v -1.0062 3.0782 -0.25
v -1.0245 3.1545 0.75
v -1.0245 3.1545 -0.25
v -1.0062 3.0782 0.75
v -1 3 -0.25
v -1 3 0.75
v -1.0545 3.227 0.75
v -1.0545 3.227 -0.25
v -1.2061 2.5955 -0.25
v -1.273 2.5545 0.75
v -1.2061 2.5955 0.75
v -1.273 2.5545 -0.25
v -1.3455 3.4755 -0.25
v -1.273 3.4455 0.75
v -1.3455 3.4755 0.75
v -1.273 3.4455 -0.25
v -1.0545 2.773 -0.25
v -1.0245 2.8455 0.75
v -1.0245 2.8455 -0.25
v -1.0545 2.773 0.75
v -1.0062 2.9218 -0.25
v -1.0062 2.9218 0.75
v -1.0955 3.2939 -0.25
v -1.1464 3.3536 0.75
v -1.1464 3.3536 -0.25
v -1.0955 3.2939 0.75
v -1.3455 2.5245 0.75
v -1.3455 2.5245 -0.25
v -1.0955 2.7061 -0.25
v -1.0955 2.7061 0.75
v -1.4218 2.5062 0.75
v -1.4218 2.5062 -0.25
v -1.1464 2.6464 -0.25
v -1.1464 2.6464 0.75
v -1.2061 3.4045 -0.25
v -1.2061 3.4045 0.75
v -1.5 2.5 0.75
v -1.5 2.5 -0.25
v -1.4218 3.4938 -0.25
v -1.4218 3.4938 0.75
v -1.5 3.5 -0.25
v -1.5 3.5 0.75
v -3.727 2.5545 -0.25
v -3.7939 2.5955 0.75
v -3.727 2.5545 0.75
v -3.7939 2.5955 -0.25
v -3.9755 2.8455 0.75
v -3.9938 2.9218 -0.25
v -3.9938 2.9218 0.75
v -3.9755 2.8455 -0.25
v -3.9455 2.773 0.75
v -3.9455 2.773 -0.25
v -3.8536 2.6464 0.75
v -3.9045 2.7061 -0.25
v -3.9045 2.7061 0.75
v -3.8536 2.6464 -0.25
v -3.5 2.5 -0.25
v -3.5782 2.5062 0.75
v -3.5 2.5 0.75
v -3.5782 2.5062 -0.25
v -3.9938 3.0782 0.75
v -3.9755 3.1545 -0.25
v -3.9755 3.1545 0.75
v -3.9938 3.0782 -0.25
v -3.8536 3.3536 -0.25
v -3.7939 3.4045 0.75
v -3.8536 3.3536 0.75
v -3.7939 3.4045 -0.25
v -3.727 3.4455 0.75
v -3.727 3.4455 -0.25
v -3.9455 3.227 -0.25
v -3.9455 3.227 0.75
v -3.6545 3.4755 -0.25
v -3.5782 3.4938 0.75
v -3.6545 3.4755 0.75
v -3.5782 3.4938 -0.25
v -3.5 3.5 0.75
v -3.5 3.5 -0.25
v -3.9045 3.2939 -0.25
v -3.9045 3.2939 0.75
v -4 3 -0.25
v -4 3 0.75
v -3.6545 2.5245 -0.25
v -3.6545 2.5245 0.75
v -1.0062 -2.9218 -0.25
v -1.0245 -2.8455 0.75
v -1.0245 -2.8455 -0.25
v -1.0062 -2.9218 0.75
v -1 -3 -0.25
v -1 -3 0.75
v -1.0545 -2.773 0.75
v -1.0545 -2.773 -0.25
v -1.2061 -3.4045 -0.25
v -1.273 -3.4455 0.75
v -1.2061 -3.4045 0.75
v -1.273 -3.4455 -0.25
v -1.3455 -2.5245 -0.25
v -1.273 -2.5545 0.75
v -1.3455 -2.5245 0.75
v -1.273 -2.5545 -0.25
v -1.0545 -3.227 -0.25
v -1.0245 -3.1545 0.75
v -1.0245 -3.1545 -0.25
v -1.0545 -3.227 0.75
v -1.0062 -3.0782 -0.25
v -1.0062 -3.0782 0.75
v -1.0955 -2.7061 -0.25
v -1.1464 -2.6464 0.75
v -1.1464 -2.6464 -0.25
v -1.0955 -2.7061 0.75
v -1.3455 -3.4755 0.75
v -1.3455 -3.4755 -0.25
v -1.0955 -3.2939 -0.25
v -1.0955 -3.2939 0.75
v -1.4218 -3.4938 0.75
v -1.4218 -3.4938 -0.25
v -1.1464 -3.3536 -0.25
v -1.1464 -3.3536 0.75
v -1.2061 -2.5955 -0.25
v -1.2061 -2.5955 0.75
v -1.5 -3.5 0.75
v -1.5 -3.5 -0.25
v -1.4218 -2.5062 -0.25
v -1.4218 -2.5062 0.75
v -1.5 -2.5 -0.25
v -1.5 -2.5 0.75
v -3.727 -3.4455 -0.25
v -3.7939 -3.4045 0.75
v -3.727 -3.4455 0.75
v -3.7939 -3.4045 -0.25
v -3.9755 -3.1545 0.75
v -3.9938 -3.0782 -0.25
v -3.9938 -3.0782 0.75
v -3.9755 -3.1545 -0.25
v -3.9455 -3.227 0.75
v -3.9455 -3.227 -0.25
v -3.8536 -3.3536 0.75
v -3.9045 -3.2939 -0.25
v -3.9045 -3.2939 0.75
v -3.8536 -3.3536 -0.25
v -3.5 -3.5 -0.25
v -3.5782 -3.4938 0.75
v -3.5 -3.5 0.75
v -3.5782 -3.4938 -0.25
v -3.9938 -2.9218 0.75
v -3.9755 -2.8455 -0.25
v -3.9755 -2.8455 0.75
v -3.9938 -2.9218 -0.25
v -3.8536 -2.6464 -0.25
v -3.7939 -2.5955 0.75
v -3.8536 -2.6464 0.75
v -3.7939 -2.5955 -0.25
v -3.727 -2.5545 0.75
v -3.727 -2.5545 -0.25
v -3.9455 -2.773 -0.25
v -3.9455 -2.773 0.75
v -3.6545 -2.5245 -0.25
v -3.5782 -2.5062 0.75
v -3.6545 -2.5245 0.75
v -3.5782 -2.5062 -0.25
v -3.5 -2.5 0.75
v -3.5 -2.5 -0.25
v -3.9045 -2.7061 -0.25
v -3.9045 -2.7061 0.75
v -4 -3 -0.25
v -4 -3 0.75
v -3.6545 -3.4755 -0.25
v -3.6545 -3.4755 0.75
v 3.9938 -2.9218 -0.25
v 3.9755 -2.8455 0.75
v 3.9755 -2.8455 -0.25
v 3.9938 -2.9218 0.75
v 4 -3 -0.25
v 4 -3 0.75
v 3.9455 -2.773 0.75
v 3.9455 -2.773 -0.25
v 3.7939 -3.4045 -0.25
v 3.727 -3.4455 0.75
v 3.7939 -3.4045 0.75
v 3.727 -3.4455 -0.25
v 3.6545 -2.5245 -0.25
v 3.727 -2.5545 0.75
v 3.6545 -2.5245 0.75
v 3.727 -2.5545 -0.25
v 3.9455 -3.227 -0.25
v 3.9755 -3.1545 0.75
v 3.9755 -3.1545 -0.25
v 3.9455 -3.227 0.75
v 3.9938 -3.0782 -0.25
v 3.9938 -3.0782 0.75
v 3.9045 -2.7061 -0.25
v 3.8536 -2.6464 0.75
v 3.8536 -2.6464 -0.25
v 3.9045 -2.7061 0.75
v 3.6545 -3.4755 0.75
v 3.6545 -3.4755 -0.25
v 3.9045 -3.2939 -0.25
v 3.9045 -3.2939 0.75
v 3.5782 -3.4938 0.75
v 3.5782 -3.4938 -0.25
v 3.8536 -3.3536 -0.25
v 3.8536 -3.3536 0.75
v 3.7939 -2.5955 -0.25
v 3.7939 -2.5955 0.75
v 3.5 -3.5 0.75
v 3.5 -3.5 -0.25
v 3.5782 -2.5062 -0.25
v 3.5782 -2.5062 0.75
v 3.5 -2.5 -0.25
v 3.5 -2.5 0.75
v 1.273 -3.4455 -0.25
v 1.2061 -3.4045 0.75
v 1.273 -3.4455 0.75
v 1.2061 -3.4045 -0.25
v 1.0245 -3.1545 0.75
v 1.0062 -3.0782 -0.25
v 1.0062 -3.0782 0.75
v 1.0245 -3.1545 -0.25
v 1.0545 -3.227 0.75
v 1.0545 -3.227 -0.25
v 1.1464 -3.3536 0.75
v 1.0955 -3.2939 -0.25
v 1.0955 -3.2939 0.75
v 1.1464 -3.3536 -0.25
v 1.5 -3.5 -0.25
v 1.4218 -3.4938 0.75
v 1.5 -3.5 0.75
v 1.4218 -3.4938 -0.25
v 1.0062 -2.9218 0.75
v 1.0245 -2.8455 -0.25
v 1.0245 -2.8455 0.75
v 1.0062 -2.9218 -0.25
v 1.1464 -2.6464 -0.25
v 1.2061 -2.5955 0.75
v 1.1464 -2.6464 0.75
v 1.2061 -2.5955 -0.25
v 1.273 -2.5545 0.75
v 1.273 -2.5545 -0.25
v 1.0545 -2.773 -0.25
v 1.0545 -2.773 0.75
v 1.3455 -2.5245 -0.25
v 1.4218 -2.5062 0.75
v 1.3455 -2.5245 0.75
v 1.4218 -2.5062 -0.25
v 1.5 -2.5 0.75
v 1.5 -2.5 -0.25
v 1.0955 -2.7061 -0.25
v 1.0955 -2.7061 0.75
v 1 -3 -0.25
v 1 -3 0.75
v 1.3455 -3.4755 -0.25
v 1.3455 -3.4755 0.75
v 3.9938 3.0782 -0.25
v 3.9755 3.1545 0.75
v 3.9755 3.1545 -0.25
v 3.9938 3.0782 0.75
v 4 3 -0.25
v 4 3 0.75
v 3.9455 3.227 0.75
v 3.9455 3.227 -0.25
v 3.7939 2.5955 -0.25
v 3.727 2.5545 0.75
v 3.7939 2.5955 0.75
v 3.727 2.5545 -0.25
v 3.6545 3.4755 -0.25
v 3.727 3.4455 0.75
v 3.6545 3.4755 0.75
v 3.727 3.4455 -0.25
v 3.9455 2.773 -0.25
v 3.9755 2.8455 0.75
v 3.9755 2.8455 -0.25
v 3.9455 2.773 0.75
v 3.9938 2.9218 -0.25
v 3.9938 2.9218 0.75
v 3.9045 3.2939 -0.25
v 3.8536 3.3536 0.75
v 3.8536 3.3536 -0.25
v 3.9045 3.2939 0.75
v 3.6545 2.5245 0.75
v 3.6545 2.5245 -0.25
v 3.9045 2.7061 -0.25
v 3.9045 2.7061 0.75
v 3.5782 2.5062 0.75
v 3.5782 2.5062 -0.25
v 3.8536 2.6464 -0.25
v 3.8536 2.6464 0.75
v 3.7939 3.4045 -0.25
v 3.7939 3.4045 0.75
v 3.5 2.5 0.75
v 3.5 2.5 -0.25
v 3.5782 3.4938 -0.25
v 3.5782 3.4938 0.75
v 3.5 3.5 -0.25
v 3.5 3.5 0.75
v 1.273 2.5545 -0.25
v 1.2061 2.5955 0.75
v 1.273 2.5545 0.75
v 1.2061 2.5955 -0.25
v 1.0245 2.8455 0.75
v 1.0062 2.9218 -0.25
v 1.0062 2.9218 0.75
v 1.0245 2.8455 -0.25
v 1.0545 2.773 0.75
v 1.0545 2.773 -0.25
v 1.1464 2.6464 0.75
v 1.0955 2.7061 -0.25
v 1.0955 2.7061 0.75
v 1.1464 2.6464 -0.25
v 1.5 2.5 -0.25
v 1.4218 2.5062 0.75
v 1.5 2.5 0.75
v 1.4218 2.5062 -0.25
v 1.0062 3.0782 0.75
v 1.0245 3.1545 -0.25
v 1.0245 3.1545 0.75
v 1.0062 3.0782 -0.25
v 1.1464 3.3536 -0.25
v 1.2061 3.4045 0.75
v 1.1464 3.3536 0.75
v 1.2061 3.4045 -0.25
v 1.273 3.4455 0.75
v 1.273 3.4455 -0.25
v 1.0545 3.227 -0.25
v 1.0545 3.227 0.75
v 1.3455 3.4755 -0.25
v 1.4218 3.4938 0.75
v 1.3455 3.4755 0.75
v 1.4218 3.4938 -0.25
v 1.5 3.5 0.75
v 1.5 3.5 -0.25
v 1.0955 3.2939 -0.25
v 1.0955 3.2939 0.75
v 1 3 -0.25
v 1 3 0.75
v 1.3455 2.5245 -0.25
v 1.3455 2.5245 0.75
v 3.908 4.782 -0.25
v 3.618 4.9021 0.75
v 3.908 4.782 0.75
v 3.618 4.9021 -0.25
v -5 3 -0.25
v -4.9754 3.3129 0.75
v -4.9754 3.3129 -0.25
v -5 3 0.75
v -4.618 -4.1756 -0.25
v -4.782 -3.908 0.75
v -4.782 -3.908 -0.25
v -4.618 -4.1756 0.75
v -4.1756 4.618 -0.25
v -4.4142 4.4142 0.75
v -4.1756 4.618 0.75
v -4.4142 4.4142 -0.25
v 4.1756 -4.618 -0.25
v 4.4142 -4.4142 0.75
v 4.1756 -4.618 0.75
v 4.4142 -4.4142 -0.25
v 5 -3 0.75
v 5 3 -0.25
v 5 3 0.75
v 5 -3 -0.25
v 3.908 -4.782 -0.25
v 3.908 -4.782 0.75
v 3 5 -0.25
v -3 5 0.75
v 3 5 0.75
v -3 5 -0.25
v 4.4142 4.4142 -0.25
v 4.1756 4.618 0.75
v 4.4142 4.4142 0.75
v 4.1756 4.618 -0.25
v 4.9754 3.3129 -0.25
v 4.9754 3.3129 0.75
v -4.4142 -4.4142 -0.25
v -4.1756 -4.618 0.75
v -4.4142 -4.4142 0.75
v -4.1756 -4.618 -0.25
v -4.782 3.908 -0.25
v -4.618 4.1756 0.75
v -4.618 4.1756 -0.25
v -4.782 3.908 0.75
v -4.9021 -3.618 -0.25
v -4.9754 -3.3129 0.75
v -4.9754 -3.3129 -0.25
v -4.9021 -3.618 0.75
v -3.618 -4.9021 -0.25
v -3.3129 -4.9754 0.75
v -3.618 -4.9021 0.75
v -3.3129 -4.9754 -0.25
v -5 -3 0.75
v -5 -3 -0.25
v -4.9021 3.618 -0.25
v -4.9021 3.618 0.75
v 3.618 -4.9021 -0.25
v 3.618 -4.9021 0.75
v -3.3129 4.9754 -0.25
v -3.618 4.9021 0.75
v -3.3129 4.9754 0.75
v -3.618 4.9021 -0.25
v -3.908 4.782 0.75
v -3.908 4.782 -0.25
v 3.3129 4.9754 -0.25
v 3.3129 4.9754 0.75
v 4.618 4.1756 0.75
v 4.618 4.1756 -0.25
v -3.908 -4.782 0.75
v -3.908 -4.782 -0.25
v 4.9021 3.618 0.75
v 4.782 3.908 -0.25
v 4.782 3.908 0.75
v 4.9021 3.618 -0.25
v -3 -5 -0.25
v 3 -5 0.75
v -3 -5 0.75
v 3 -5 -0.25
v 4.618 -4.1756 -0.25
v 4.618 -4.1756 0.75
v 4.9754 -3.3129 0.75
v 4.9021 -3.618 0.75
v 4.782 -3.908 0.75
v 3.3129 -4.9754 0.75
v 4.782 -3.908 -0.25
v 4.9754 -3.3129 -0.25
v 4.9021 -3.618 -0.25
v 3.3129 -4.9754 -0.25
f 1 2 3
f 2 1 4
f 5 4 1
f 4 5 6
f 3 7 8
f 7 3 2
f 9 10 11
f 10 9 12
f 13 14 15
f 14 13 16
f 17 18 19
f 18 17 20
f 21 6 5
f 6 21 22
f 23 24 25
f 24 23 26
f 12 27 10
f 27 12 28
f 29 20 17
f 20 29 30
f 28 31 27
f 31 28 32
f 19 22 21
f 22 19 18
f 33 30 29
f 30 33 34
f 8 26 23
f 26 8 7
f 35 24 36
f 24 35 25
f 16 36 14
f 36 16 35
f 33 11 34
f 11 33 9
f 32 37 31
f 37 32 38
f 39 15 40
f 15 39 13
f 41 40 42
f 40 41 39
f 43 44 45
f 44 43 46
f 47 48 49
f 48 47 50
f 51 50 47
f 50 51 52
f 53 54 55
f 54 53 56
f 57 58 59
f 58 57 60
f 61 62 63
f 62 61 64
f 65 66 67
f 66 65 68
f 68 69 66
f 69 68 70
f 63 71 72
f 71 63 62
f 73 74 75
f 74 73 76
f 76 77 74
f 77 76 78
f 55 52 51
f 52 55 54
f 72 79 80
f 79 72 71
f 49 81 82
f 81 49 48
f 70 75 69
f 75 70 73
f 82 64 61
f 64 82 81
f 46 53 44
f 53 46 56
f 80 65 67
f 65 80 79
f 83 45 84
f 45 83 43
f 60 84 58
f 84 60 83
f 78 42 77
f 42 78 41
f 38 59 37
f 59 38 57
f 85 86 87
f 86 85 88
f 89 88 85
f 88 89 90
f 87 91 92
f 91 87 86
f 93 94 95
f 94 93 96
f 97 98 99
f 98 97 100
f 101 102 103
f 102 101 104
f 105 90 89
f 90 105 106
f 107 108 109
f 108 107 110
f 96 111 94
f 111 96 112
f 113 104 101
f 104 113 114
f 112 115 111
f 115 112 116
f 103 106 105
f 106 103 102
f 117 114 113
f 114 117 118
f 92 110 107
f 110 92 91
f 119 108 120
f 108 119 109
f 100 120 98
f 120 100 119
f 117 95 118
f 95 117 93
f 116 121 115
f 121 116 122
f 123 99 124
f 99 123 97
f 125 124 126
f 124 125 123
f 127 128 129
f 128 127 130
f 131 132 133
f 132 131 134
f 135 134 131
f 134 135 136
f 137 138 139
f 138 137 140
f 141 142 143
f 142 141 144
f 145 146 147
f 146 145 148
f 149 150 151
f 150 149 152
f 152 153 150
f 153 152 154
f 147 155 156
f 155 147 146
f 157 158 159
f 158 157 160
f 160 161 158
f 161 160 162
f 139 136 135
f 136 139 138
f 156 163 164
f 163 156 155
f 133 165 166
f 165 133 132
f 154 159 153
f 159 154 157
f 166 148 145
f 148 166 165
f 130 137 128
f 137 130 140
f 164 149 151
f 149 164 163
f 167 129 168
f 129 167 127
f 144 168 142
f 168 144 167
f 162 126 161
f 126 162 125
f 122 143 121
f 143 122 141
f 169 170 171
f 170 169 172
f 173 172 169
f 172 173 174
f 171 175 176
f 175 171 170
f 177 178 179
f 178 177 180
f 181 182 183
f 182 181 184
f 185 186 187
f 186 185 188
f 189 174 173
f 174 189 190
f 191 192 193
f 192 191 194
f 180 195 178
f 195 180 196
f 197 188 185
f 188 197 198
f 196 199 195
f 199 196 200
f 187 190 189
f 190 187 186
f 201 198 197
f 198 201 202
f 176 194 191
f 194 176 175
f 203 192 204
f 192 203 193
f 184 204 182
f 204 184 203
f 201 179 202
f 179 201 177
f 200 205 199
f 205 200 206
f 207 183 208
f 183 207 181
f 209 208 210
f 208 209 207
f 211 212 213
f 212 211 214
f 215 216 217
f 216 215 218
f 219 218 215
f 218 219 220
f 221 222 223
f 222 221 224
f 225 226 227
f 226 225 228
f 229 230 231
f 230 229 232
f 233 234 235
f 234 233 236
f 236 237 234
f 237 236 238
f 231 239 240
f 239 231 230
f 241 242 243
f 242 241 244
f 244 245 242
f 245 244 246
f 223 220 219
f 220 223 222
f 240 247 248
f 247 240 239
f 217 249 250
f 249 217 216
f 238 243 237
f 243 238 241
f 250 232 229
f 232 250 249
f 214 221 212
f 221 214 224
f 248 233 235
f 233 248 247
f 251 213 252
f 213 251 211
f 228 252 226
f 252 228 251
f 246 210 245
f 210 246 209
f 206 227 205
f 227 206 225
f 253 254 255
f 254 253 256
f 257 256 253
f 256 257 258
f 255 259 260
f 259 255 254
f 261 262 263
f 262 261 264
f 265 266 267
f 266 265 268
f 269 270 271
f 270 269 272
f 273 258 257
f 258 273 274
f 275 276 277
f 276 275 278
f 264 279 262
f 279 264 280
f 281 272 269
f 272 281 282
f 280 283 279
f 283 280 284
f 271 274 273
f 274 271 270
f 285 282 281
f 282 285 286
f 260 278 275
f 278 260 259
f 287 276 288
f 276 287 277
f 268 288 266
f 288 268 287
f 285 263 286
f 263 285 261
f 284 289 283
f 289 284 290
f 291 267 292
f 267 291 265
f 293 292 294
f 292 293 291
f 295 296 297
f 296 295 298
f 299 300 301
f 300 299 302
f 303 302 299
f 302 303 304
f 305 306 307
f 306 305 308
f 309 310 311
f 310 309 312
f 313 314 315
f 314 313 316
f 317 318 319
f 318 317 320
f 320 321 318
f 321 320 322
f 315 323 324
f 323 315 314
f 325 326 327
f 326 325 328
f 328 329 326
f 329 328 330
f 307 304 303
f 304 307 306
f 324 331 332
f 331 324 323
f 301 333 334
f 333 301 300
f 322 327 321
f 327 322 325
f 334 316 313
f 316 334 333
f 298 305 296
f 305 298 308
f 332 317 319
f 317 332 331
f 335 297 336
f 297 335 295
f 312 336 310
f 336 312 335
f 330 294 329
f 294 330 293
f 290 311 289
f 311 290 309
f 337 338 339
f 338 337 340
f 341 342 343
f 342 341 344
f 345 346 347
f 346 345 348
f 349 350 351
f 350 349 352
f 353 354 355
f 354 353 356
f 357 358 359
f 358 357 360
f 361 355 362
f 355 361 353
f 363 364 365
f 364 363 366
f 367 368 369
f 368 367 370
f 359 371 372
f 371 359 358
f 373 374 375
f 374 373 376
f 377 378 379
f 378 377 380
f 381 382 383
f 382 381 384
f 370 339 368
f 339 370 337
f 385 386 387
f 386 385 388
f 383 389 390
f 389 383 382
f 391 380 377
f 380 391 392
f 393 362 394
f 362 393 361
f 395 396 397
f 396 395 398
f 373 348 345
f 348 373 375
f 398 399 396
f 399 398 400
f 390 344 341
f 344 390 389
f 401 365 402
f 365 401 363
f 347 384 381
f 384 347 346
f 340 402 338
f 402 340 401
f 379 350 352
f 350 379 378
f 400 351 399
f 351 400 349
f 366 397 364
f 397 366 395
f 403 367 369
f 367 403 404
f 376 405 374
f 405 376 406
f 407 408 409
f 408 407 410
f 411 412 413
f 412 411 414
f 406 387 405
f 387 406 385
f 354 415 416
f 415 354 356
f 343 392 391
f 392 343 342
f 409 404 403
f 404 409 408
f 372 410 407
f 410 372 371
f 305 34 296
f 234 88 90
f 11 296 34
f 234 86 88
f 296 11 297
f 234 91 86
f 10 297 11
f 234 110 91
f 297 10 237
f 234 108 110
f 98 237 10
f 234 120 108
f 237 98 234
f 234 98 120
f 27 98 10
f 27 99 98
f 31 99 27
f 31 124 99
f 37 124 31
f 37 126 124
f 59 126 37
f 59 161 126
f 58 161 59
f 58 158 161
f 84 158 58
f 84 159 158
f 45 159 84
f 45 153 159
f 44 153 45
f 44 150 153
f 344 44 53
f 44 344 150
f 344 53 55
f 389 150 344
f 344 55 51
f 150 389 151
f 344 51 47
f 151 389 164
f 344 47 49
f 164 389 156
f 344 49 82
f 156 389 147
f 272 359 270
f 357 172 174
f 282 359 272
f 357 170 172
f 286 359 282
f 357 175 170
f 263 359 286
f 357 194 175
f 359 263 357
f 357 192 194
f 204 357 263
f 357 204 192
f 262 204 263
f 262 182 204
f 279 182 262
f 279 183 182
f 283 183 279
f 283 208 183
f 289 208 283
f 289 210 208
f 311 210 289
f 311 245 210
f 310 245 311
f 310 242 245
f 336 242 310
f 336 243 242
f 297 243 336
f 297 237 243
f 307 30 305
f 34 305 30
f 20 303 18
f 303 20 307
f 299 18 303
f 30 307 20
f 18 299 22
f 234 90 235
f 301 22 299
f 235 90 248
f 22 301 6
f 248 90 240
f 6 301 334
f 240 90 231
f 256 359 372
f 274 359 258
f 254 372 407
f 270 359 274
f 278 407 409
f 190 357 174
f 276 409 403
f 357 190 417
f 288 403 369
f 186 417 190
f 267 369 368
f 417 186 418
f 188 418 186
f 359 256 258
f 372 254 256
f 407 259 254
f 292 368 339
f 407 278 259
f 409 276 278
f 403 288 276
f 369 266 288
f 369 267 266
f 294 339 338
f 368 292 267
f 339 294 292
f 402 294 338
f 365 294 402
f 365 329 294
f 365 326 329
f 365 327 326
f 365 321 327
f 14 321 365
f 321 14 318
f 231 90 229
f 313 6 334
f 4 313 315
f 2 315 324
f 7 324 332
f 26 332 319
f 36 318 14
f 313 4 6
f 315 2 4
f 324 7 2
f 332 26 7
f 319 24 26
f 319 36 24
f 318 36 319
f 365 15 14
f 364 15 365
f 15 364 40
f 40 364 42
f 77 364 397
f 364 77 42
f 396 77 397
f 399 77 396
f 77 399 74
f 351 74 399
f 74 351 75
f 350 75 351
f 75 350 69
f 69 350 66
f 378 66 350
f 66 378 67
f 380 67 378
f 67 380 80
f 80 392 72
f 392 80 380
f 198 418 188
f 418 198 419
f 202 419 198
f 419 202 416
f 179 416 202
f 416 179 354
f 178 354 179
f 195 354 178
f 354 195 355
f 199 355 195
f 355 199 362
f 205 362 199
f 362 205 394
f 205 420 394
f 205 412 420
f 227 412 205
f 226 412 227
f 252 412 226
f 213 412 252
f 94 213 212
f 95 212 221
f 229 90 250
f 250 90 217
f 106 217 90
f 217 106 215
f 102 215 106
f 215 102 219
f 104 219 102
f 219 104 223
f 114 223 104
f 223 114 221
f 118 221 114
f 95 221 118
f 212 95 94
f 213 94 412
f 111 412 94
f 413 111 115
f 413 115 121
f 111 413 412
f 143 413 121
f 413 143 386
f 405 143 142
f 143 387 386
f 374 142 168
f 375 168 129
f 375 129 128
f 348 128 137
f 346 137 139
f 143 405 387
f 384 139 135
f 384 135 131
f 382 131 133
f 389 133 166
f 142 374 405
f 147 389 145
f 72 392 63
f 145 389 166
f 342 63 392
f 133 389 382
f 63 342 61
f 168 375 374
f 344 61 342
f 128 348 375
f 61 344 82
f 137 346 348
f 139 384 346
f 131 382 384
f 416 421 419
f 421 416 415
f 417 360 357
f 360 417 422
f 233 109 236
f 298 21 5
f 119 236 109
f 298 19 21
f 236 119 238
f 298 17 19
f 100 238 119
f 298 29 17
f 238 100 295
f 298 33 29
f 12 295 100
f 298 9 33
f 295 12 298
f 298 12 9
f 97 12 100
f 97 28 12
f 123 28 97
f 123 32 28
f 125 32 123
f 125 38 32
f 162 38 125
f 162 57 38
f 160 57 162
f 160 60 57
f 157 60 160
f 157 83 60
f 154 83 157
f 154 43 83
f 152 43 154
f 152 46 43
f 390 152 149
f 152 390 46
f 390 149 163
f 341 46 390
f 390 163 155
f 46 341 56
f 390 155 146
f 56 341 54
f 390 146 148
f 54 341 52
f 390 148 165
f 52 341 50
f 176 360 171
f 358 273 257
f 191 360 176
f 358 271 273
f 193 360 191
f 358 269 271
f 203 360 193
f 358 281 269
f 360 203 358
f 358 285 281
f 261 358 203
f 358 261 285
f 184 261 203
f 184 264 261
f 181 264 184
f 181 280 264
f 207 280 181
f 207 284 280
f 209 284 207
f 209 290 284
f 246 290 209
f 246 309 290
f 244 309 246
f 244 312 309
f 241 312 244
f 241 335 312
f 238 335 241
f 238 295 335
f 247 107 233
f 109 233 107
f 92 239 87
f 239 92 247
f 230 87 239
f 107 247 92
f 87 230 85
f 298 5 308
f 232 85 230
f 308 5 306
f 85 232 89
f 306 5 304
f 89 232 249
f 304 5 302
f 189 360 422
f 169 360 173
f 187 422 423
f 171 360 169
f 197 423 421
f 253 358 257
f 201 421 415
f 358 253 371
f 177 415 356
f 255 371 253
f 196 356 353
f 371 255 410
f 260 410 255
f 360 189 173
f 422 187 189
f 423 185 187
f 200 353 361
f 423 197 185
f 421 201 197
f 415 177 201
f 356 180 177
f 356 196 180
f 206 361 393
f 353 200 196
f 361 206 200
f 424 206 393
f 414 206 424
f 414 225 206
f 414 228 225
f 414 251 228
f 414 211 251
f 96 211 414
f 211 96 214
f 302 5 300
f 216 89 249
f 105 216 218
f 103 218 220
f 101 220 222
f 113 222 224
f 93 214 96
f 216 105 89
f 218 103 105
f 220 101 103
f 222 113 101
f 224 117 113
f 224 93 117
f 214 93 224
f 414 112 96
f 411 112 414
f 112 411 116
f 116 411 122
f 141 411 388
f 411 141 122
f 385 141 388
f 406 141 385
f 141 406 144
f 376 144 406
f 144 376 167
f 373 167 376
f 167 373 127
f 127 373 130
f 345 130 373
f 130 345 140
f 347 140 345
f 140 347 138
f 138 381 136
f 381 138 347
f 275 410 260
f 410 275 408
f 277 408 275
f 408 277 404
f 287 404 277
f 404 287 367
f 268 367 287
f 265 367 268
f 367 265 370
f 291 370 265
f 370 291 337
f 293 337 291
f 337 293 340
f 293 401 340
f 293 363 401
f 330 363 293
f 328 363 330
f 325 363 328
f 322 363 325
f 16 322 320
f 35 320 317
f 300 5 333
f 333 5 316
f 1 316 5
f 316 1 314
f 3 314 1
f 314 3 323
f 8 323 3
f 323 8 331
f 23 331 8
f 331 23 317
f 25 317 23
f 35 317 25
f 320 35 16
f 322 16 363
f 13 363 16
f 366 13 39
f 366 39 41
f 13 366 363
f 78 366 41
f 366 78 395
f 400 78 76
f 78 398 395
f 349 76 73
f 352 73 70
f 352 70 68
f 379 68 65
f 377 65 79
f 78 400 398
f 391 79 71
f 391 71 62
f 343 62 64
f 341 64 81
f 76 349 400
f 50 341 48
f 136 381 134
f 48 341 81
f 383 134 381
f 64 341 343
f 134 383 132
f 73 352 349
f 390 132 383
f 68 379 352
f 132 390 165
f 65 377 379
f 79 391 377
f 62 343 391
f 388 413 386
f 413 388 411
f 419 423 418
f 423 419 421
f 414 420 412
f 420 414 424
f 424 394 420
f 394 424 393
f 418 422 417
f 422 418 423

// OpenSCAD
module Piece_01(){

    module Mech_Piece_01(){

    Key_Lenght = 10;
    Key_Height = 10;
    Key_Width = 15;

    color("#a8b0b2")
    union(){
        translate([1,0,0])
        cylinder(5,0.5,0.5, $fn=40, center=true);

        translate([-1,0,0])
        cylinder(5,0.5,0.5, $fn=40, center=true);

        cube([2,1,5],center = true);
        }

    }
    difference(){

        minkowski(){

            cube([6,6,0.5],center = true);

            translate([0,0,0], $fn = 40)
            cylinder(0.5,2,2);
        }
        translate([-2.5,3,0]){
        Mech_Piece_01();
        }
        translate([-2.5,-3,0]){
        Mech_Piece_01();
        }
        translate([2.5,-3,0]){
        Mech_Piece_01();
        }
        translate([2.5,3,0]){
        Mech_Piece_01();
        }
    }

}

Piece_01();


// Written by Nicolì Angelo (Gengio) 2024: 
// MIT License

//Permission is hereby granted, free of charge, to any person obtaining a copy of this software and associated documentation files (the "Software"), to deal in the Software without restriction, including without limitation the rights to use, copy, modify, merge, publish, distribute, sublicense, and/or sell copies of the Software, and to permit persons to whom the Software is furnished to do so, subject to the following conditions:

//The above copyright notice and this permission notice shall be included in all copies or substantial portions of the Software.

//THE SOFTWARE IS PROVIDED "AS IS", WITHOUT WARRANTY OF ANY KIND, EXPRESS OR IMPLIED, INCLUDING BUT NOT LIMITED TO THE WARRANTIES OF MERCHANTABILITY, FITNESS FOR A PARTICULAR PURPOSE AND NONINFRINGEMENT. IN NO EVENT SHALL THE AUTHORS OR COPYRIGHT HOLDERS BE LIABLE FOR ANY CLAIM, DAMAGES OR OTHER LIABILITY, WHETHER IN AN ACTION OF CONTRACT, TORT OR OTHERWISE, ARISING FROM, OUT OF OR IN CONNECTION WITH THE SOFTWARE OR THE USE OR OTHER DEALINGS IN THE SOFTWARE.
